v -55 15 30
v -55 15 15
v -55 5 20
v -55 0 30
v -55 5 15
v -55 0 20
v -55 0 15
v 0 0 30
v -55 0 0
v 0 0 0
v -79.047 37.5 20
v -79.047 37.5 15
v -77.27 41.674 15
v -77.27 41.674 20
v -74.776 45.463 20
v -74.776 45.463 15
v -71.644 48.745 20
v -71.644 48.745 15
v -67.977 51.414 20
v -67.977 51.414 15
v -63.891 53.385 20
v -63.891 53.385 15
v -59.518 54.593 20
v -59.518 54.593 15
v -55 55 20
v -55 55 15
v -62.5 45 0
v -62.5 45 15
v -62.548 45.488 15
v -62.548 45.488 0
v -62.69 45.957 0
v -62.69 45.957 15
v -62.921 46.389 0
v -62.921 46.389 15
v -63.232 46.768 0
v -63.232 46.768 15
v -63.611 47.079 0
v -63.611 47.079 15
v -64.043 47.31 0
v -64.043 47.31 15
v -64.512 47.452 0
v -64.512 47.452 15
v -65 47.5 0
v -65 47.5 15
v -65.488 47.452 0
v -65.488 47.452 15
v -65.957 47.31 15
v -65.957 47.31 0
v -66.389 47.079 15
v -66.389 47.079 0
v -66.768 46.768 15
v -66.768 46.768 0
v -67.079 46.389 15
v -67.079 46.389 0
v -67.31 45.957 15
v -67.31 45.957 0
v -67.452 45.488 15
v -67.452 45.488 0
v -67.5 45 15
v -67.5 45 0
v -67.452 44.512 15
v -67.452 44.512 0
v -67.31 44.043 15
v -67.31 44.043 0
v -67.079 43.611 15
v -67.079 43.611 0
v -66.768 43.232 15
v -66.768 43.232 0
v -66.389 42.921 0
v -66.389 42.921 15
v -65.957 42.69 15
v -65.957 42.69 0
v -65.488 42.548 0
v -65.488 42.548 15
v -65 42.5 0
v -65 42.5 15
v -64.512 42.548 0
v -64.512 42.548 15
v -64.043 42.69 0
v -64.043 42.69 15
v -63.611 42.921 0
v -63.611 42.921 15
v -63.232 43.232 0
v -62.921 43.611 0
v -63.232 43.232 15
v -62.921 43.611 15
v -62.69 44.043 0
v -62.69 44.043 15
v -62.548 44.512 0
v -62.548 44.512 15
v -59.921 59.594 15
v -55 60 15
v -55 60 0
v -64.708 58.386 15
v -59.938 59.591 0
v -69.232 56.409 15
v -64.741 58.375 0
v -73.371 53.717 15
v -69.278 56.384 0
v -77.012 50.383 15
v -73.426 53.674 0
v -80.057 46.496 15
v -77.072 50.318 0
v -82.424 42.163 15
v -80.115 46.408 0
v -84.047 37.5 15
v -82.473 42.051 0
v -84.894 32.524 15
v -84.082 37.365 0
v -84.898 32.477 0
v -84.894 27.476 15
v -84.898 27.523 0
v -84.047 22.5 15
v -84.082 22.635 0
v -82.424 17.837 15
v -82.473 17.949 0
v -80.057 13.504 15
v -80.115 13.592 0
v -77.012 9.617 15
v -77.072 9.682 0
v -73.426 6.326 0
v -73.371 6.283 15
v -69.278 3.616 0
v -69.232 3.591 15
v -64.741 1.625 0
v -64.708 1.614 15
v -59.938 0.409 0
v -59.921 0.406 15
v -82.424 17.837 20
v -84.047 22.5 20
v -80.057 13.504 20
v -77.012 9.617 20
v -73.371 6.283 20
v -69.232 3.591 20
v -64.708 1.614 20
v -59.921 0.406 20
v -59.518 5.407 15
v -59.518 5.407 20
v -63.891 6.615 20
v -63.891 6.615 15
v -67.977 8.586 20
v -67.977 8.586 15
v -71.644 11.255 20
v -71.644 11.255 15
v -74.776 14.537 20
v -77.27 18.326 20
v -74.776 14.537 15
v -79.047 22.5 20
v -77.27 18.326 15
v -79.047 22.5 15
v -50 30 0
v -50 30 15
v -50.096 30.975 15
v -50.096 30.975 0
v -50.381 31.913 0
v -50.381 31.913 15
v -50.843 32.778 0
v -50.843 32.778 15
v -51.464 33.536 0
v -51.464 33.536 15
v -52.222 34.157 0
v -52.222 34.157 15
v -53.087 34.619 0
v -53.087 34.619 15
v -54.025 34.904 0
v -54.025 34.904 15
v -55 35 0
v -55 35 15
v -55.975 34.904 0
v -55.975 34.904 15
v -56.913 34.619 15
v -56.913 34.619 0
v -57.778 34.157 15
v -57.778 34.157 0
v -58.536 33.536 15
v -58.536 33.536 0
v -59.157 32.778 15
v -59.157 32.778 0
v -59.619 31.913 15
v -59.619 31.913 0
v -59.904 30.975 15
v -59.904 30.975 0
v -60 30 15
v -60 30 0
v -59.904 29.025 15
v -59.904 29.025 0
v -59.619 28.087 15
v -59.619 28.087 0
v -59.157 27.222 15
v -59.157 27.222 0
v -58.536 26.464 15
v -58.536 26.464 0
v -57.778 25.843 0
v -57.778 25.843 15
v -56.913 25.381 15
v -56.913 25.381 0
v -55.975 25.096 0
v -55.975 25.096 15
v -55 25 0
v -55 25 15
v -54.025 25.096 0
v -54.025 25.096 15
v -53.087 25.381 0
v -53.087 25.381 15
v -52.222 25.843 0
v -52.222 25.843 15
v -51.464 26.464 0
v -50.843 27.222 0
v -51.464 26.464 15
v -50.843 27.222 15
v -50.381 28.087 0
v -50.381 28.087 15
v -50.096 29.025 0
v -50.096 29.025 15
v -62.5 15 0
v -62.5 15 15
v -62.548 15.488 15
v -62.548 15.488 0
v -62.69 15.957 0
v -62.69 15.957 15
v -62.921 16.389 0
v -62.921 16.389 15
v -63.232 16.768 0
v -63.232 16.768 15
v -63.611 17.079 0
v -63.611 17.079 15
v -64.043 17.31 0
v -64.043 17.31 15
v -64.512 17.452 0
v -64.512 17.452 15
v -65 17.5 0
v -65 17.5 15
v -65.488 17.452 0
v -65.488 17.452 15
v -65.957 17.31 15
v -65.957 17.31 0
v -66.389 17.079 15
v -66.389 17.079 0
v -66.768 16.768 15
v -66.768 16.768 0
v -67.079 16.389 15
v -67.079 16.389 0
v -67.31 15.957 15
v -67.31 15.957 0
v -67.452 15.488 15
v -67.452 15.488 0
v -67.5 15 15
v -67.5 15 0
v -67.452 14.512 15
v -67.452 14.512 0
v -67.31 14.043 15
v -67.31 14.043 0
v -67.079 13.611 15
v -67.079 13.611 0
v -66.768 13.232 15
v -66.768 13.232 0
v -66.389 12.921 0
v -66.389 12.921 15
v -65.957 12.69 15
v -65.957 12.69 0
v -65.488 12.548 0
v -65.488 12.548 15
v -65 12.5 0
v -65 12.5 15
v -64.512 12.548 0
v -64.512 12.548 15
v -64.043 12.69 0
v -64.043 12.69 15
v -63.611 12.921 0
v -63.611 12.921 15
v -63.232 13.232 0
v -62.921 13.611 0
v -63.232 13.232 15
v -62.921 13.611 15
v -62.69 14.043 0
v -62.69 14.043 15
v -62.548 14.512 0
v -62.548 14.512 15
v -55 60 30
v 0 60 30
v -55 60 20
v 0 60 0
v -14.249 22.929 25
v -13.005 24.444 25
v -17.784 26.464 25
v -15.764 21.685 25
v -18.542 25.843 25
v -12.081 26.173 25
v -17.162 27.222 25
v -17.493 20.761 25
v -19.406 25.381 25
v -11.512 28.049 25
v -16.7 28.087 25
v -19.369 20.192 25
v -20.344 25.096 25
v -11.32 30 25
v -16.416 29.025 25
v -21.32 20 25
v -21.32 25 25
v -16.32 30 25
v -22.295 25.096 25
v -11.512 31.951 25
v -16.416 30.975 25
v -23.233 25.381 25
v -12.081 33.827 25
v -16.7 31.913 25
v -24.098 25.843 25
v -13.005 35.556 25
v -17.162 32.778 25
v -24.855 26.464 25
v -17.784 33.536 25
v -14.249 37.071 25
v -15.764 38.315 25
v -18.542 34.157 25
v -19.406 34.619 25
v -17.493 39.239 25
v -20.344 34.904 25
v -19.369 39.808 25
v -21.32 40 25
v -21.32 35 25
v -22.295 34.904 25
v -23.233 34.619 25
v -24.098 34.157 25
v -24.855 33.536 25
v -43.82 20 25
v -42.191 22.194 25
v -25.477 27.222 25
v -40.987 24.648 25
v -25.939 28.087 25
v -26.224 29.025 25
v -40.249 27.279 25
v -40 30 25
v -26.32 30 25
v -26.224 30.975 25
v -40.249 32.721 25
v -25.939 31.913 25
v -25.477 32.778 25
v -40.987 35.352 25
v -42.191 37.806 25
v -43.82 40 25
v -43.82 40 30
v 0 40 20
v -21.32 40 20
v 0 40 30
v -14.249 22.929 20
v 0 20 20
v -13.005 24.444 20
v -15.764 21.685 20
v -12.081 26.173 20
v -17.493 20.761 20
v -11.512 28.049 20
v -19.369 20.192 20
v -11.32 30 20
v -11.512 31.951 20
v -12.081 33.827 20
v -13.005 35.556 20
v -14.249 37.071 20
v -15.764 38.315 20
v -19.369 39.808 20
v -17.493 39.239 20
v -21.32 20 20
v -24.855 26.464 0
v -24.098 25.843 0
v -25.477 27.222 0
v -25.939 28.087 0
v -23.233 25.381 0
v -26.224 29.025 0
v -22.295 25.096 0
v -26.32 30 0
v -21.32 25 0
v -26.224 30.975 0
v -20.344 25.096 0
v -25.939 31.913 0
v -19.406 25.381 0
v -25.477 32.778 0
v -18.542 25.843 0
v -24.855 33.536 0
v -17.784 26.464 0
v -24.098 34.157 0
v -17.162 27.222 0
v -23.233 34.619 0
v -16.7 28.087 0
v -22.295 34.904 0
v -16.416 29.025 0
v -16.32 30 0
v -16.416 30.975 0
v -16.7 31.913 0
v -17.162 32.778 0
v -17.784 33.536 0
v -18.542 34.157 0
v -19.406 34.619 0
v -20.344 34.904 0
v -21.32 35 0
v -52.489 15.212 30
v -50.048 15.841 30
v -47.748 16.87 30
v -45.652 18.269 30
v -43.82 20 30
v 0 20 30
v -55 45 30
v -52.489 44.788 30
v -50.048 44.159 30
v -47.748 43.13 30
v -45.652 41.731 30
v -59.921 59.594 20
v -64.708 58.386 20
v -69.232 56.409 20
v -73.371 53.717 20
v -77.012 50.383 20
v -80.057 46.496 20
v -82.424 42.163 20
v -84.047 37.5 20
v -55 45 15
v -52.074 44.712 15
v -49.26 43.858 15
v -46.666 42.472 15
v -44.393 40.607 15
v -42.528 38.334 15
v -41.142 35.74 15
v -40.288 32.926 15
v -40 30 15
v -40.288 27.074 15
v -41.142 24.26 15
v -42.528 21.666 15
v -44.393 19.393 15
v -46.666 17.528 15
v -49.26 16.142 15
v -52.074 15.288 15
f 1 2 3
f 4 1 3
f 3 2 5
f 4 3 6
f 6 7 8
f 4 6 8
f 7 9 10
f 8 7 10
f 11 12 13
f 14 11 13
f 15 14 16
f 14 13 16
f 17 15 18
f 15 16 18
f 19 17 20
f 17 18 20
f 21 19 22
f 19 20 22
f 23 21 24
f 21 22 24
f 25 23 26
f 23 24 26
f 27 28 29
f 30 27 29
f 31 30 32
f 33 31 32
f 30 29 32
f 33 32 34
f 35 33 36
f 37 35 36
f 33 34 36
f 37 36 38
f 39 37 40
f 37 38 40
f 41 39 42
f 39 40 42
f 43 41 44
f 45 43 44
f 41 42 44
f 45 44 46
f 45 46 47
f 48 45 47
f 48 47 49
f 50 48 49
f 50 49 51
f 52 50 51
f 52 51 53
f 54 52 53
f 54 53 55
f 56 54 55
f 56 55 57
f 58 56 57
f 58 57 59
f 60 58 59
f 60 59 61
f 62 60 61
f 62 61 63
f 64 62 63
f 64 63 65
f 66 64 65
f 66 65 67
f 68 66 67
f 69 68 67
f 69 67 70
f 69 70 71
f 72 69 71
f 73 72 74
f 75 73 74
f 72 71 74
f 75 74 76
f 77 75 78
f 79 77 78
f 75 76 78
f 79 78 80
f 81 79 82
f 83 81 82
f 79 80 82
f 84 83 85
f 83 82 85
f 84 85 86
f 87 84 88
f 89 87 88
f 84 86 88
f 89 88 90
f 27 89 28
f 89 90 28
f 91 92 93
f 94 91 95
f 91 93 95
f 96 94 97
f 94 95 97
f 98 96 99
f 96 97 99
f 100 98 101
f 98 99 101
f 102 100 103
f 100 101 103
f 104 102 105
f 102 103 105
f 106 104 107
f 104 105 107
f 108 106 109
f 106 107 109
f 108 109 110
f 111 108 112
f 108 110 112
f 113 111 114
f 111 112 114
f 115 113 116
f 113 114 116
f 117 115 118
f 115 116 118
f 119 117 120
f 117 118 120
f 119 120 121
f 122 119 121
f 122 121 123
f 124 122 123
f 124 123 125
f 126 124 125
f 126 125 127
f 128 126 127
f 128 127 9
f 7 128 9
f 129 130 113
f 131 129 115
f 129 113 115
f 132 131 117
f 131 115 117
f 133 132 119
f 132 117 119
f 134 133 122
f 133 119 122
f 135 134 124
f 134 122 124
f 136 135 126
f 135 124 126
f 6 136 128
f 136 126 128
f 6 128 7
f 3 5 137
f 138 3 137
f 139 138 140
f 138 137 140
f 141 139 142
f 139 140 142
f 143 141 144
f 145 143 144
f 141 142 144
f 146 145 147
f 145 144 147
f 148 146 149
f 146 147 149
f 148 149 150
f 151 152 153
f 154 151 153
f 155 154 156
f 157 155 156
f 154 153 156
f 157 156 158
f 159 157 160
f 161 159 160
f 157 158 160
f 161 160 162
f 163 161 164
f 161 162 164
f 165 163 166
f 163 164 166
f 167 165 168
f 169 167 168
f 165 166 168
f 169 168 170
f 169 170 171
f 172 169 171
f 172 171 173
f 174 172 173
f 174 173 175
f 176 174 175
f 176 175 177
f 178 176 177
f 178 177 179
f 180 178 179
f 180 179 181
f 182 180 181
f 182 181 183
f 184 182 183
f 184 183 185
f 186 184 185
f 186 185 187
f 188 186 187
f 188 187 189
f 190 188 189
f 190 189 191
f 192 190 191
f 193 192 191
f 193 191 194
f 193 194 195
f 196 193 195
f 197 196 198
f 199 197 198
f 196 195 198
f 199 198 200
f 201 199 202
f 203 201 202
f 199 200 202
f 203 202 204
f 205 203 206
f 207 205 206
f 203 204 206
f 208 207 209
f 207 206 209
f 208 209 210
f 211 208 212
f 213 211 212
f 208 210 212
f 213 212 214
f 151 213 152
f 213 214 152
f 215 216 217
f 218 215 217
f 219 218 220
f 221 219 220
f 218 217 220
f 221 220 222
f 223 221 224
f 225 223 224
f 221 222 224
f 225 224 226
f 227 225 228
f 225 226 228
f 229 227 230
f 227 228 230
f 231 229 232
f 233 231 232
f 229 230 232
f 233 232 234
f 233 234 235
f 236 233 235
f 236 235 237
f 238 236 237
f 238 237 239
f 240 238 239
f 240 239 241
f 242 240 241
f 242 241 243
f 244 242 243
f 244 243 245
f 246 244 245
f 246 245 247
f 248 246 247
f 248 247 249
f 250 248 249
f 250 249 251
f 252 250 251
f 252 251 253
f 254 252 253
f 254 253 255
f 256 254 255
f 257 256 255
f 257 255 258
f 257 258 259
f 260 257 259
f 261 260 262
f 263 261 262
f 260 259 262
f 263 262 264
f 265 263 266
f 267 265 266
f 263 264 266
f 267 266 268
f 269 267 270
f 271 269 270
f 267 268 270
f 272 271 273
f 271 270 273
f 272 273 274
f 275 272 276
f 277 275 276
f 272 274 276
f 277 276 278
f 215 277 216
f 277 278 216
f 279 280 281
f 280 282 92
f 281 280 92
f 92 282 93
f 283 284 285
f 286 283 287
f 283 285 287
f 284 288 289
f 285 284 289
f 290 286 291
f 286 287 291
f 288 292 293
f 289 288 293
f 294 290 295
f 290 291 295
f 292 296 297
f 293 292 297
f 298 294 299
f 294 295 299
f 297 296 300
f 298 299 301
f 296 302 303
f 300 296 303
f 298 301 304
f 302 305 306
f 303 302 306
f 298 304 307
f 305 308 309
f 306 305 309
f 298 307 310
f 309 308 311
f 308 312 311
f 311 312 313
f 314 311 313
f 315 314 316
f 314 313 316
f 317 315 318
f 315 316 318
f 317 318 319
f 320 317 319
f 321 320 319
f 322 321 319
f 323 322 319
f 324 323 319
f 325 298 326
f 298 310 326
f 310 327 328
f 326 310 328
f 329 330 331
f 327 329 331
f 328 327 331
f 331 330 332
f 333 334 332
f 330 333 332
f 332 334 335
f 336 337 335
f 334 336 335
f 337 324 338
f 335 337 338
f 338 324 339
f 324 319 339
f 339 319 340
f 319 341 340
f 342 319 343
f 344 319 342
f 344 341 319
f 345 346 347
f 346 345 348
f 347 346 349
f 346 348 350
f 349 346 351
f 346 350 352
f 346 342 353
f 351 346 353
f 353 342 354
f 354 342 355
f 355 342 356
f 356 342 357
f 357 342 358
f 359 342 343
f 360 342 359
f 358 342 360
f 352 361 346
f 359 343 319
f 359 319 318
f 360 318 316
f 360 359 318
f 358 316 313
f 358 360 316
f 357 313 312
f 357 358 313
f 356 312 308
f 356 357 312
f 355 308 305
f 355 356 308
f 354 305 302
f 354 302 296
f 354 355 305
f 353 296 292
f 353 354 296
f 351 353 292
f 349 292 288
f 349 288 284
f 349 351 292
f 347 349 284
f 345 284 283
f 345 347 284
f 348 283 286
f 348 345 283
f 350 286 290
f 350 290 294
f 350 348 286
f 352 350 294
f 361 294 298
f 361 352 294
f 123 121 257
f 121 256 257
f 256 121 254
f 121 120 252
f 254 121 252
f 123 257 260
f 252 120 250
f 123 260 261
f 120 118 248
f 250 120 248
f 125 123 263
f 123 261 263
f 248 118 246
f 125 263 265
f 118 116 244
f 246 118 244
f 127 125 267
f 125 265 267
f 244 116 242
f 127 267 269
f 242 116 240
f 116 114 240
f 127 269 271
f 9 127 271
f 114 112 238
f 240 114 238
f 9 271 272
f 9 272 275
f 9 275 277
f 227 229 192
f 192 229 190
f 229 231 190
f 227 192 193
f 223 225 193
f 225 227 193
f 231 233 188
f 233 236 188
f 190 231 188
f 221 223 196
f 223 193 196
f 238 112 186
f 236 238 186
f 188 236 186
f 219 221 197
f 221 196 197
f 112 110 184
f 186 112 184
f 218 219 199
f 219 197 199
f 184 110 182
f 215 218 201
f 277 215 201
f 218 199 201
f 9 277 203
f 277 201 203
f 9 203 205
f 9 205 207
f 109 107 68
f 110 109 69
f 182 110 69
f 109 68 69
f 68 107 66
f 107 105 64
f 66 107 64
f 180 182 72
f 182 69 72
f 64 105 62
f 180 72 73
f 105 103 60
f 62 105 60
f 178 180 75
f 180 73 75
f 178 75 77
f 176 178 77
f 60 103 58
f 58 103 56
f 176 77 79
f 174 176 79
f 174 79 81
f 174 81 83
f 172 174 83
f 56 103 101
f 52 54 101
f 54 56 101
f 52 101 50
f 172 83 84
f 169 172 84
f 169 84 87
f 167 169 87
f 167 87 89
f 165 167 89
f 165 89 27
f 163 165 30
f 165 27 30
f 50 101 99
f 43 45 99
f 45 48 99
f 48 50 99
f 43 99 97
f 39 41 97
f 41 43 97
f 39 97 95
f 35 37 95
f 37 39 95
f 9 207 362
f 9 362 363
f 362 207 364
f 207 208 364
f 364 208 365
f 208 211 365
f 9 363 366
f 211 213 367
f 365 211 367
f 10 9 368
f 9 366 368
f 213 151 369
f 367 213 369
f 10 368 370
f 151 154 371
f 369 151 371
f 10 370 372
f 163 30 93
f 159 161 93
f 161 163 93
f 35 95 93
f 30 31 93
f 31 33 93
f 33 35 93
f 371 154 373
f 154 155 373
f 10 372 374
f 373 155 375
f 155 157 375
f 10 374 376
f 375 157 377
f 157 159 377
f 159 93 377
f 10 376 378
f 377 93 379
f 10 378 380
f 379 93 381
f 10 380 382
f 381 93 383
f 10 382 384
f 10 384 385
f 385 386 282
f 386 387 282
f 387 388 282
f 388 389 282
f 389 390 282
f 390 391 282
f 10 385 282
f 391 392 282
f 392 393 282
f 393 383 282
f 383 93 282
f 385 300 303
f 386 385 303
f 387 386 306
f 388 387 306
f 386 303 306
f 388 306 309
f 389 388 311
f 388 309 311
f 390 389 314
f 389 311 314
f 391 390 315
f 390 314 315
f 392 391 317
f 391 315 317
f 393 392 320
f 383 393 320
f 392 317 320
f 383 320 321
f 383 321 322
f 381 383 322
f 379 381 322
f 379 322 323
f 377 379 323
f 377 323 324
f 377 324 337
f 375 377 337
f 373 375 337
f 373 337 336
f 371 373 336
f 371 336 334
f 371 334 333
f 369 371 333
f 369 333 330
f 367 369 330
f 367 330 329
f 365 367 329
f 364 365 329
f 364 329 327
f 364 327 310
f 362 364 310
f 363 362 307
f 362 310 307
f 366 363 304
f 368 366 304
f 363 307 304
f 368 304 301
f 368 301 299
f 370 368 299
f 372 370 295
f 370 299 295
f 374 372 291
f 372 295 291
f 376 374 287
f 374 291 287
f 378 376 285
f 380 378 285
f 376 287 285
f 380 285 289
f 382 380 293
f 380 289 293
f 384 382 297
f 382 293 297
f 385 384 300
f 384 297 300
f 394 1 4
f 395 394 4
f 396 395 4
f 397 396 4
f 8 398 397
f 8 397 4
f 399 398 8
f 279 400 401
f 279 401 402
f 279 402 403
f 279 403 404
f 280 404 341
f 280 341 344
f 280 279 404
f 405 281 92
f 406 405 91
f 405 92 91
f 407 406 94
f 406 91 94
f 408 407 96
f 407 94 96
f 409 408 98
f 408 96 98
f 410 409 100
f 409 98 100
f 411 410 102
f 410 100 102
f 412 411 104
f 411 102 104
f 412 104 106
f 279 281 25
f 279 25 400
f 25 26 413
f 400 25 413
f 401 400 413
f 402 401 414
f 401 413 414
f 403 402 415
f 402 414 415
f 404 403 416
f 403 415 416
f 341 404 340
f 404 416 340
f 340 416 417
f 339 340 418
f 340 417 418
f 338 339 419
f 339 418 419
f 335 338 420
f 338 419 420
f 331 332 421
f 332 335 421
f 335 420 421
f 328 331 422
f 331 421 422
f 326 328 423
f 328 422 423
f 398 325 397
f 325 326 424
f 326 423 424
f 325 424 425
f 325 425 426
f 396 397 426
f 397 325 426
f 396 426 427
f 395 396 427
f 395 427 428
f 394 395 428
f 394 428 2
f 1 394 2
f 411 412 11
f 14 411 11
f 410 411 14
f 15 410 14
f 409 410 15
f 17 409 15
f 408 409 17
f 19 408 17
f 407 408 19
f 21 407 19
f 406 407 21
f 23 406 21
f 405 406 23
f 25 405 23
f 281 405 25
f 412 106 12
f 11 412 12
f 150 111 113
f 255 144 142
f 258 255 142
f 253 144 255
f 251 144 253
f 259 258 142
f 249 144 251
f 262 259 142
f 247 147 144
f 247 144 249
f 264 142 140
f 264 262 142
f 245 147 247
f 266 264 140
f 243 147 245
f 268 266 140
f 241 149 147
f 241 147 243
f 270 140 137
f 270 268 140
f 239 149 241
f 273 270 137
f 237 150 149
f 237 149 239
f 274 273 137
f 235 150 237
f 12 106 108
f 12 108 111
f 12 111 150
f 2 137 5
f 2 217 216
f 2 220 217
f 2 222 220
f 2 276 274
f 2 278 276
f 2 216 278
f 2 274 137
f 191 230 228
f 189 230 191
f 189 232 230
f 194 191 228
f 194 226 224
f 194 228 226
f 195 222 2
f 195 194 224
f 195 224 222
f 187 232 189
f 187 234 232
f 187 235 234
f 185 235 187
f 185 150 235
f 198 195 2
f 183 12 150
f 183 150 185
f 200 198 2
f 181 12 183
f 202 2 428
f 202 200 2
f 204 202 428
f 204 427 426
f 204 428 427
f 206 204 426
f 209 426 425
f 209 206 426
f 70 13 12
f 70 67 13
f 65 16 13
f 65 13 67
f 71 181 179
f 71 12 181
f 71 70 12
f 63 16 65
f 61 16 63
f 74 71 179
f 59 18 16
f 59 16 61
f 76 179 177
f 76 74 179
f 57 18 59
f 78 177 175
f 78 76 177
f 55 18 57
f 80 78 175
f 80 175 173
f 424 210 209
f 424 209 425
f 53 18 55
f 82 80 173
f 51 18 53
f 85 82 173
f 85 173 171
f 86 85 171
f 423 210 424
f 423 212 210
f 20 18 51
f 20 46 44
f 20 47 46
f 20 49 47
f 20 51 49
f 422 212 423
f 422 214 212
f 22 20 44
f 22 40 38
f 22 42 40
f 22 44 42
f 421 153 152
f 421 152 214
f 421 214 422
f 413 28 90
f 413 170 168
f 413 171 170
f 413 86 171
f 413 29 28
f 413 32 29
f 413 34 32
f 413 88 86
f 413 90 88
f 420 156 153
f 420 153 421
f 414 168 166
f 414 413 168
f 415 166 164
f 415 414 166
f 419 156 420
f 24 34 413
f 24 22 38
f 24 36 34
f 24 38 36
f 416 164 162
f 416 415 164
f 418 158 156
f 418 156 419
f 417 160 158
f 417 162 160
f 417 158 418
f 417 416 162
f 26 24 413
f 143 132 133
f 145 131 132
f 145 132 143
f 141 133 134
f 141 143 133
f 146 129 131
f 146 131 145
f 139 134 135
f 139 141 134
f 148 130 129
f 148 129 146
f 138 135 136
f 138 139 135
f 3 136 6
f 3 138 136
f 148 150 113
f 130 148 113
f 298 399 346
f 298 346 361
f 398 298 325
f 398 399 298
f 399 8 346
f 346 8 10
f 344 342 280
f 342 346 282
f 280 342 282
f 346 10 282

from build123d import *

# Parameters (mm, degrees)
BOSS_EXTRUDE4_DEPTH = 15
BOSS_EXTRUDE5_DEPTH = 5
BOSS_EXTRUDE8_DEPTH = 15
CUT_EXTRUDE2_DEPTH  = 10
BOSS_EXTRUDE9_DEPTH = 5
SKETCH11_R          = 5
CUT_EXTRUDE3_DEPTH  = 54
SKETCH12_R          = 5
SKETCH12_R_2        = 2.5
CUT_EXTRUDE4_DEPTH  = 76


with BuildPart() as part:
    # Sketch2 → Boss-Extrude4 (new body)
    with BuildSketch(Plane.XY):
        with BuildLine():
            Line((-55, 0), (0, 0))
            Line((0, 0), (0, 60))
            Line((0, 60), (-55, 60))
            ThreePointArc((-55, 60), (-85, 30), (-55, 0))
        make_face()
    extrude(amount=BOSS_EXTRUDE4_DEPTH)

    # Sketch5 → Boss-Extrude5 (add)
    with BuildSketch(Plane.XY.offset(15)):
        with BuildLine():
            Line((-84.047375097, 37.5), (-79.047375097, 37.5))
            ThreePointArc((-79.047375097, 37.5), (-69.870493007, 50.161897068), (-55, 55))
            Line((-55, 55), (-55, 60))
            ThreePointArc((-55, 60), (-73.371173071, 53.717082451), (-84.047375097, 37.5))
        make_face()
        with BuildLine():
            Line((-55, 0), (-55, 5))
            ThreePointArc((-55, 5), (-69.870493007, 9.838102932), (-79.047375097, 22.5))
            Line((-79.047375097, 22.5), (-84.047375097, 22.5))
            ThreePointArc((-84.047375097, 22.5), (-73.371173071, 6.282917549), (-55, 0))
        make_face()
    extrude(amount=BOSS_EXTRUDE5_DEPTH)

    # Sketch6 → Boss-Extrude8 (add)
    with BuildSketch(Plane.XY.offset(15)):
        with BuildLine():
            Line((-55, 60), (-55, 45))
            ThreePointArc((-55, 45), (-40, 30), (-55, 15))
            Line((-55, 15), (-55, 0))
            Line((-55, 0), (0, 0))
            Line((0, 0), (0, 60))
            Line((0, 60), (-55, 60))
        make_face()
    extrude(amount=BOSS_EXTRUDE8_DEPTH)

    # Sketch9 → Cut-Extrude2 (cut)
    with BuildSketch(Plane.XY.offset(30)):
        with BuildLine():
            Line((-43.819660113, 40), (0, 40))
            Line((0, 40), (0, 20))
            Line((0, 20), (-43.819660113, 20))
            ThreePointArc((-43.819660113, 20), (-40, 30), (-43.819660113, 40))
        make_face()
    extrude(amount=-CUT_EXTRUDE2_DEPTH, mode=Mode.SUBTRACT)

    # Sketch10 → Boss-Extrude9 (add)
    with BuildSketch(Plane.XY.offset(20)):
        with BuildLine():
            Line((-43.819660113, 40), (-21.319660113, 40))
            ThreePointArc((-21.319660113, 40), (-11.319660113, 30), (-21.319660113, 20))
            Line((-21.319660113, 20), (-43.819660113, 20))
            ThreePointArc((-43.819660113, 20), (-40, 30), (-43.819660113, 40))
        make_face()
    extrude(amount=BOSS_EXTRUDE9_DEPTH)

    # Sketch11 → Cut-Extrude3 (cut)
    with BuildSketch(Plane.XY.offset(25)):
        with Locations((-21.319660113, 30)):
            Circle(SKETCH11_R)
    extrude(amount=-CUT_EXTRUDE3_DEPTH, mode=Mode.SUBTRACT)

    # Sketch12 → Cut-Extrude4 (cut)
    with BuildSketch(Plane.XY.offset(15)):
        with Locations((-55, 30)):
            Circle(SKETCH12_R)
        with Locations((-65, 15)):
            Circle(SKETCH12_R_2)
        with Locations((-65, 45)):
            Circle(SKETCH12_R_2)
    extrude(amount=-CUT_EXTRUDE4_DEPTH, mode=Mode.SUBTRACT)


solid = part.part
